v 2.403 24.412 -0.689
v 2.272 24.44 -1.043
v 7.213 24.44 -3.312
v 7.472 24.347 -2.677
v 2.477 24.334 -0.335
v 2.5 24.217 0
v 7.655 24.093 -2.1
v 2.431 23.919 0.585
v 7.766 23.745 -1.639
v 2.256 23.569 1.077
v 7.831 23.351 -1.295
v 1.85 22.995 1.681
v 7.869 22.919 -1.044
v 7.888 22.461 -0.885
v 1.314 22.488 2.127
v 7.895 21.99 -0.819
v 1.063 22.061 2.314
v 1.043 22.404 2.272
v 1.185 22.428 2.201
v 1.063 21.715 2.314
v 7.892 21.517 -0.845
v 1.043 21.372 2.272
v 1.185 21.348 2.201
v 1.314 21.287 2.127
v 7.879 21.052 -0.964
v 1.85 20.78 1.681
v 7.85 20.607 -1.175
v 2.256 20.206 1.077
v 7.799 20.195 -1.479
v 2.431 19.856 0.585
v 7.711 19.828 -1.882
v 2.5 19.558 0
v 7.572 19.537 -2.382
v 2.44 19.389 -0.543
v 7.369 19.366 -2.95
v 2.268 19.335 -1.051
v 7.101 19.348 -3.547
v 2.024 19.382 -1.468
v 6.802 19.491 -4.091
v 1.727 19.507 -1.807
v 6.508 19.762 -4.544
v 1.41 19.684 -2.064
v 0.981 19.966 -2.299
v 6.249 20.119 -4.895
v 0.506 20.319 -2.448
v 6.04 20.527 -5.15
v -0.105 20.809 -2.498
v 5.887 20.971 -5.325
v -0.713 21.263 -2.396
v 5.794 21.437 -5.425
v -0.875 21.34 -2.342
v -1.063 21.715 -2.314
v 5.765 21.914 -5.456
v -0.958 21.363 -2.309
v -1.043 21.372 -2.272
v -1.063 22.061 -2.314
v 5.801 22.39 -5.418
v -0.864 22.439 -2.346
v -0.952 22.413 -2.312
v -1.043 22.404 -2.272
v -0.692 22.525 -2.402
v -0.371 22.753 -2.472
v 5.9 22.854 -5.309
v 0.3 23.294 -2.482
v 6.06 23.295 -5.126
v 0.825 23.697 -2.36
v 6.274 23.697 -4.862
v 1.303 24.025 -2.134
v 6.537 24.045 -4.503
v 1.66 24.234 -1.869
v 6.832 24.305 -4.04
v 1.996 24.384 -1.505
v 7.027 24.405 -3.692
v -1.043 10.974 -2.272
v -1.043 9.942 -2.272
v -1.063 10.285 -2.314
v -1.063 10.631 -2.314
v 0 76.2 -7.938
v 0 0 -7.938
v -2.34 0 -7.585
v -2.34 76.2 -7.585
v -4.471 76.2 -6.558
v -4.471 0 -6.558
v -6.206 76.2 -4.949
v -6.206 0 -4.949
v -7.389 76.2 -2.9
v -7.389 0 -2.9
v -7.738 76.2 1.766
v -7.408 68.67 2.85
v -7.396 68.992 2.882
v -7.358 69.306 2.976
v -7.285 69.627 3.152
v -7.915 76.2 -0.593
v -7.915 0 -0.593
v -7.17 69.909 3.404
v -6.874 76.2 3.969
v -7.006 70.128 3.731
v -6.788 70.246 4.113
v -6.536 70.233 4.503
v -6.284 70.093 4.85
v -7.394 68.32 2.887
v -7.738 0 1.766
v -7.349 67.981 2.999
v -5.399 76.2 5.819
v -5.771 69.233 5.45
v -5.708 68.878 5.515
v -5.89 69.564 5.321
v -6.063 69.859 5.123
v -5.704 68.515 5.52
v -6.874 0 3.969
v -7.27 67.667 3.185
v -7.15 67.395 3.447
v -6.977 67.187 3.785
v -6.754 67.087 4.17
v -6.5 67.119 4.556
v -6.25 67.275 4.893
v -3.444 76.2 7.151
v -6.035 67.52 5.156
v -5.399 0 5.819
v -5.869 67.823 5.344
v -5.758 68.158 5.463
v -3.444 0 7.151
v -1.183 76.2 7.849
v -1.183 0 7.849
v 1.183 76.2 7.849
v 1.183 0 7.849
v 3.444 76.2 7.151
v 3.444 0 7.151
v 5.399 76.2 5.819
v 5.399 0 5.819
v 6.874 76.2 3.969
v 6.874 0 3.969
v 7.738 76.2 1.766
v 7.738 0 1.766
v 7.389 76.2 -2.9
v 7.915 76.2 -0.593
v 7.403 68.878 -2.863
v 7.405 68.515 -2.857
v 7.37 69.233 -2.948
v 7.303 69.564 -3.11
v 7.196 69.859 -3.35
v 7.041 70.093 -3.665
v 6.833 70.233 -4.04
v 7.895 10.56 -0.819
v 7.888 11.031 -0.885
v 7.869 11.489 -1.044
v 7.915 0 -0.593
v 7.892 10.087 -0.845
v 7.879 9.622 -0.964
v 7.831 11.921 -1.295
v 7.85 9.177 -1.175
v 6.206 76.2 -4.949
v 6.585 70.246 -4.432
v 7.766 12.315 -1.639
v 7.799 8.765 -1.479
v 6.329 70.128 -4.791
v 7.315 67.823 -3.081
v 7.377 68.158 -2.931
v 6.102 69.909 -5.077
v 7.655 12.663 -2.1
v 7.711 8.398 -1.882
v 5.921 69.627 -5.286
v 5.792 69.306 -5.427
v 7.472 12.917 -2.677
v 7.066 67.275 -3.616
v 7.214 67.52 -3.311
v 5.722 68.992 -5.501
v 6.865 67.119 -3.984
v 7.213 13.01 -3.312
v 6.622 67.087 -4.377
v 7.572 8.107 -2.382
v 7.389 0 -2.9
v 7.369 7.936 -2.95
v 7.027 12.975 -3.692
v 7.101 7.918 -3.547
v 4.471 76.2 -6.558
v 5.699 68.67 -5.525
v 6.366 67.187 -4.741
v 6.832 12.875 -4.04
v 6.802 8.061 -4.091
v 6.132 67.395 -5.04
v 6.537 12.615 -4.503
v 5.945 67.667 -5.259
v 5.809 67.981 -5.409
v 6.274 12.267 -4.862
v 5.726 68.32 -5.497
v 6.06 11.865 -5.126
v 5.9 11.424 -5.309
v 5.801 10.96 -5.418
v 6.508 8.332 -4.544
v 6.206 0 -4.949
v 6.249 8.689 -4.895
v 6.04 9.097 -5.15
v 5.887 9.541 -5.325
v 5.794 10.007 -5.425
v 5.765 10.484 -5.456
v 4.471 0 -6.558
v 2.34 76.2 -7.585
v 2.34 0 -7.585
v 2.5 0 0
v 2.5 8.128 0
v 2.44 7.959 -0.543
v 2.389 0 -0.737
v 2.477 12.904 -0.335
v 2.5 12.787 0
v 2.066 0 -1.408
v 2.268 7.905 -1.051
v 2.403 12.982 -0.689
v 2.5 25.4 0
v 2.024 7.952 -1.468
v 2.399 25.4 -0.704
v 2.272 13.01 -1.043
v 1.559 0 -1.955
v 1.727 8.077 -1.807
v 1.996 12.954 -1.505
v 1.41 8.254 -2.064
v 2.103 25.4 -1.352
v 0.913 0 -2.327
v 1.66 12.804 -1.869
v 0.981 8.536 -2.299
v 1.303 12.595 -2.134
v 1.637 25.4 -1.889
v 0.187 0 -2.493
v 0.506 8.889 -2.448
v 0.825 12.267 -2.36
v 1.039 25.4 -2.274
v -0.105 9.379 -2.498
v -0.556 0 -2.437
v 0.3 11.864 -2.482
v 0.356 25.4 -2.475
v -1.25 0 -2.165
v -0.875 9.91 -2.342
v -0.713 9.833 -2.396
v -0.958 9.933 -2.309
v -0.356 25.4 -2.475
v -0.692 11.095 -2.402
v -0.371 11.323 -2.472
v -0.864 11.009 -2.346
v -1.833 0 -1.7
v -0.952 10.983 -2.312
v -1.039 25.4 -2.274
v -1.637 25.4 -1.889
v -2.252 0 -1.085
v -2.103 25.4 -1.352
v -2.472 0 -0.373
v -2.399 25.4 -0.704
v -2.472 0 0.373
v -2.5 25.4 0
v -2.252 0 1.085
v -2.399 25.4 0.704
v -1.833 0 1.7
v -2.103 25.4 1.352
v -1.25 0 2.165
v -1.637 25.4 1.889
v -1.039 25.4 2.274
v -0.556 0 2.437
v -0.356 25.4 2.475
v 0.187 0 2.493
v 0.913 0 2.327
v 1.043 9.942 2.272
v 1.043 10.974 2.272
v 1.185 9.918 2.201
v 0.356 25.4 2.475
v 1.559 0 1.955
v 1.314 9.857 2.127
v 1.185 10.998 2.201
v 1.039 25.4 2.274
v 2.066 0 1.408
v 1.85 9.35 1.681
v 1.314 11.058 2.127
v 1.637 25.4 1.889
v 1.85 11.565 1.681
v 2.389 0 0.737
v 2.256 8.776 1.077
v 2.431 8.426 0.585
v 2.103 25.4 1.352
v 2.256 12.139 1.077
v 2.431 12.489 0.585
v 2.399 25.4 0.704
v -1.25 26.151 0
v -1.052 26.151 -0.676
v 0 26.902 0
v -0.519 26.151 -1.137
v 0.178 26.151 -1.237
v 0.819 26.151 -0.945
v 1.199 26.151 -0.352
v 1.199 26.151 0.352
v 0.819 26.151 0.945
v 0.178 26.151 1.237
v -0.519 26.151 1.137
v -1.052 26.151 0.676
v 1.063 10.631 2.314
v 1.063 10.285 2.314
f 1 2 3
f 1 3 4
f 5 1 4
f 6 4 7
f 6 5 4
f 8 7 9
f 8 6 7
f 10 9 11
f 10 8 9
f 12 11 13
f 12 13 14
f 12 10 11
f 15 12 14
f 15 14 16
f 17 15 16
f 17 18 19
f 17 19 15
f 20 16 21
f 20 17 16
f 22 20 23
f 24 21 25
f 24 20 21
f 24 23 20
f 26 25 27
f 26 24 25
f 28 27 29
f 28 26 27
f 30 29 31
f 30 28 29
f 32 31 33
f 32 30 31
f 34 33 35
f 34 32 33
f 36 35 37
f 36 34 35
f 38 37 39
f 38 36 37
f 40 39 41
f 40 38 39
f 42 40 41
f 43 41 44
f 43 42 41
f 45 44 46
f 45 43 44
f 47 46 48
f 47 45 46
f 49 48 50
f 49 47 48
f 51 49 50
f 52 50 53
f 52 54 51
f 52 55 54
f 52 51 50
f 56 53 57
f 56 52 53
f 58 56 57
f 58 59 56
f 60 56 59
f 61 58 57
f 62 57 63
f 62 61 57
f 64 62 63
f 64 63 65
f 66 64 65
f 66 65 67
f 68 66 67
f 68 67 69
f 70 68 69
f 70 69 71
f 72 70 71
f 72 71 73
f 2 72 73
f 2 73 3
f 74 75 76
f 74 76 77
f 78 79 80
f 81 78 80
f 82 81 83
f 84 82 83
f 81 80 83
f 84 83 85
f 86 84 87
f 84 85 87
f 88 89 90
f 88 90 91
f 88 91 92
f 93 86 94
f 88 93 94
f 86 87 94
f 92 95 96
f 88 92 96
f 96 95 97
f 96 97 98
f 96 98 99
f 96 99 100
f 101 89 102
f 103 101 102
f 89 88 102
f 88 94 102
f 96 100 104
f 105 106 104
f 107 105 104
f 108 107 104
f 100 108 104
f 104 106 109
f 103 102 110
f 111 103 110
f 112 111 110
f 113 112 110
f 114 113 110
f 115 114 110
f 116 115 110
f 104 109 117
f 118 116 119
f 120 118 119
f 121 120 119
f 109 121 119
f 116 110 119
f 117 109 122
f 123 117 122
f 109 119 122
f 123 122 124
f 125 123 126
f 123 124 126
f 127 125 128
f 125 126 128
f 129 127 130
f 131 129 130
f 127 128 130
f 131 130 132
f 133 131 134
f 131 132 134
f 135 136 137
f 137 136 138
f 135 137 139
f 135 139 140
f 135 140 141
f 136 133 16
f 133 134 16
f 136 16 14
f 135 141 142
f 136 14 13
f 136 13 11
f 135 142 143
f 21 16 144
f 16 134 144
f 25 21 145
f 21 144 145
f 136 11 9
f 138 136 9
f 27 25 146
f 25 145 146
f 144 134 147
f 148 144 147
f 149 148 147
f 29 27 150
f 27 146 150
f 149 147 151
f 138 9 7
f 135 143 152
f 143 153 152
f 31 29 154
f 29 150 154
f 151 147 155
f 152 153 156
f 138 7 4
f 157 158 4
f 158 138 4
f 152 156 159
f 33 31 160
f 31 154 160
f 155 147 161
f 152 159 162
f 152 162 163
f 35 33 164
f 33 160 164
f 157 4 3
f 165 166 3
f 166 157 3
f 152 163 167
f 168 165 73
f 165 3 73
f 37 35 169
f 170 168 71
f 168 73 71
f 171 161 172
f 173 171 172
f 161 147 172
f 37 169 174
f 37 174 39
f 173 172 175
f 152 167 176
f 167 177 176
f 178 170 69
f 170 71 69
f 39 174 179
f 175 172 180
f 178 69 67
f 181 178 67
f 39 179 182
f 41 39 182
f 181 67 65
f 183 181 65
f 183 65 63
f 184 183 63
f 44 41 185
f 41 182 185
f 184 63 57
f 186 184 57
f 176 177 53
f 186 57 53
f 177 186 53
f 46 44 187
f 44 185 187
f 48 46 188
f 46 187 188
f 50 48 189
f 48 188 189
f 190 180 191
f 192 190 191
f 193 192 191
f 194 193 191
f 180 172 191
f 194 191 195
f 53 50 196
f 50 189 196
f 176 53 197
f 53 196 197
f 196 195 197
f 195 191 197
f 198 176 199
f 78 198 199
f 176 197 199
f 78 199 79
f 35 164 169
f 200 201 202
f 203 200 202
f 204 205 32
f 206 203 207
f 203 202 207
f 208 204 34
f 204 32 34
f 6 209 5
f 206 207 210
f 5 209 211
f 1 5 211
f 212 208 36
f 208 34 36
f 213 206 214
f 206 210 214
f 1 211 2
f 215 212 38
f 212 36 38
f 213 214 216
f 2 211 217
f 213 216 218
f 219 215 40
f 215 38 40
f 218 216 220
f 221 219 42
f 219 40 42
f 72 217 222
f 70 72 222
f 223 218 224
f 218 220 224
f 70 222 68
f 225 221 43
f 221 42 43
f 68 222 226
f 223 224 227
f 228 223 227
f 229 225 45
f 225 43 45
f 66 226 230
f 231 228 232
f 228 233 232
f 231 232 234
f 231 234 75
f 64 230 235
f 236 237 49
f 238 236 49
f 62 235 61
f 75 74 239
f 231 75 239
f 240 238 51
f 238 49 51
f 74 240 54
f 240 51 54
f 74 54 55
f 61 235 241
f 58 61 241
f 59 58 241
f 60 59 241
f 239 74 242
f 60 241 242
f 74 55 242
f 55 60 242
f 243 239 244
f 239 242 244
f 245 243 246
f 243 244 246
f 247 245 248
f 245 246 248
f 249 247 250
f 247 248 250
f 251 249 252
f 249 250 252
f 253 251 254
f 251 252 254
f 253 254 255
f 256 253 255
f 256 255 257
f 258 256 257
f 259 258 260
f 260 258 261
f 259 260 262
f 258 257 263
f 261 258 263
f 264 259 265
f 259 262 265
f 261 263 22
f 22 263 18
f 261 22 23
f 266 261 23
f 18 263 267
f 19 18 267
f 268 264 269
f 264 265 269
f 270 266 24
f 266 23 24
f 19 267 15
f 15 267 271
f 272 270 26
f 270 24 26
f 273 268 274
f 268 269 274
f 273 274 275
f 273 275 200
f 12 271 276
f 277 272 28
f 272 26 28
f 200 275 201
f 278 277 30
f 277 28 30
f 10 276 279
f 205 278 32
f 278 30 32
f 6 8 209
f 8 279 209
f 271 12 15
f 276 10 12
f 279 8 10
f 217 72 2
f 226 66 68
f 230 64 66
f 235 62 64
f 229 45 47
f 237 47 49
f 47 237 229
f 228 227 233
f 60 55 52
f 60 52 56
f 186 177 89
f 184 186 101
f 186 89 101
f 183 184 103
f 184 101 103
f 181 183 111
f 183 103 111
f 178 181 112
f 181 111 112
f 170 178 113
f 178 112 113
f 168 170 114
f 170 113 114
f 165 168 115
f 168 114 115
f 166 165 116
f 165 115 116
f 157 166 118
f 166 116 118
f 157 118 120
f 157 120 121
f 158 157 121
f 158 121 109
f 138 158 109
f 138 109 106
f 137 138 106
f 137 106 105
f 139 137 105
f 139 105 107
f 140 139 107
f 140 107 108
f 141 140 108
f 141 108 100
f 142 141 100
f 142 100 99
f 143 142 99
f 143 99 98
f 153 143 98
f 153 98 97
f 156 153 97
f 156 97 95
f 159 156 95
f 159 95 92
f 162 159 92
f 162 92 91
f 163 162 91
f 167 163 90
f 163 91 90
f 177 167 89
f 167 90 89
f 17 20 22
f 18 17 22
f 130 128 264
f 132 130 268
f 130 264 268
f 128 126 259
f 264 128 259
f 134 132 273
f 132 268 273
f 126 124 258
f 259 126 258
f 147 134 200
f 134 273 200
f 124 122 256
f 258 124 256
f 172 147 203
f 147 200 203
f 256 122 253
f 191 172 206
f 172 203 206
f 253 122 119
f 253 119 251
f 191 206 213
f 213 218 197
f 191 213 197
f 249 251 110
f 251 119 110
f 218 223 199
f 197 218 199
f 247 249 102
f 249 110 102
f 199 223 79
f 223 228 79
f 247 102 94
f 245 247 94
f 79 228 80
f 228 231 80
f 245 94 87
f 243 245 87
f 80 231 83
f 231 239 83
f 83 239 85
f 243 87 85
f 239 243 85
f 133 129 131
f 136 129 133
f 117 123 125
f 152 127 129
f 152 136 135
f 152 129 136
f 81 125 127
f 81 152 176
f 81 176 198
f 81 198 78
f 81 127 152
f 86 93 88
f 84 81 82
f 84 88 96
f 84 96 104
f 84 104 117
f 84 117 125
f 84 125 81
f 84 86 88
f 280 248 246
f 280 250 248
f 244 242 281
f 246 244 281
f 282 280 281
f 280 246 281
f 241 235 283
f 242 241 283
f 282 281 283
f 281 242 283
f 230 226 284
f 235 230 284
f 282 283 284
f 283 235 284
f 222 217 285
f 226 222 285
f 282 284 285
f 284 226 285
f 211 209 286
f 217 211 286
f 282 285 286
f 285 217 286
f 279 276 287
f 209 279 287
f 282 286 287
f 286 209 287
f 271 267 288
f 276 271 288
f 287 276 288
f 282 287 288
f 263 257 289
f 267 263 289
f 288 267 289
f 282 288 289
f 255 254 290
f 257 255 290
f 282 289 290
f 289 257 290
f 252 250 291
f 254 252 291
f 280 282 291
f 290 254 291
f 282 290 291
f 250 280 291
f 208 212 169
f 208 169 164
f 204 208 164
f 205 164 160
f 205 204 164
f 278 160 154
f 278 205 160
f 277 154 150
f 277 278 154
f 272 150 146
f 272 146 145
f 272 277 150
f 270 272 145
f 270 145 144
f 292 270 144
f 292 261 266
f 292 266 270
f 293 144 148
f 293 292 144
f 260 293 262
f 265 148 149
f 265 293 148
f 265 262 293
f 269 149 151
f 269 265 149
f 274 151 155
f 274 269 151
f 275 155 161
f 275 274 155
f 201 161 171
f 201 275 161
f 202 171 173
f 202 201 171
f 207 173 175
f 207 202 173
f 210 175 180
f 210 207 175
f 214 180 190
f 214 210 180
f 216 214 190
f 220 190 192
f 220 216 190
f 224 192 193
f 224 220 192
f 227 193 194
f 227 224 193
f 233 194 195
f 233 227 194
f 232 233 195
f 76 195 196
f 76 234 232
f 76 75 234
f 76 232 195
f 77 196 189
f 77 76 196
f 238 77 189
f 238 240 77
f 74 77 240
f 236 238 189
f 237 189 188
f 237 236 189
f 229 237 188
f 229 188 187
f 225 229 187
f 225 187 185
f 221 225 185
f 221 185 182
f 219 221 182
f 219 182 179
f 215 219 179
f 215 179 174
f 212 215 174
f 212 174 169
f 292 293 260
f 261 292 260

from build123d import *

# Parameters (mm, degrees)
SKETCH1_R                           = 7.9375
BOSS_EXTRUDE1_DEPTH                 = 76.2
F_1_8_0_1250_DOWEL_HOLE1_D          = 3.175
F_1_8_0_1250_DOWEL_HOLE1_DEPTH      = 17.526
F_1_8_0_1250_DOWEL_HOLE1_TIP        = 0.953866233
F_5_0MM_DOWEL_HOLE1_D               = 5
F_5_0MM_DOWEL_HOLE1_DEPTH           = 25.4
F_5_0MM_DOWEL_HOLE1_TIP             = 1.502151548
TAP_DRILL_FOR_1_4_20_TAP1_OUTLINE_R = 2.5527
TAP_DRILL_FOR_1_4_20_TAP1_DEPTH     = 9


with BuildPart() as part:
    # Sketch1 → Boss-Extrude1 (new body)
    with BuildSketch(Plane(origin=(0, 0, 0), x_dir=(1, 0, 0), z_dir=(0, 1, 0))):
        with Locations(Location((0, 0, 0), (0, 0, 90))):
            Circle(SKETCH1_R)
    extrude(amount=BOSS_EXTRUDE1_DEPTH)

    # 1/8 (0.1250) Dowel Hole1
    with Locations(Plane(origin=(6.688476845, 68.670007772, -4.274129589), x_dir=(0.538473019062, 0, 0.842642752145), z_dir=(0.842642752145, 0, -0.538473019062))):
        with Locations((0, 0)):
            Hole(F_1_8_0_1250_DOWEL_HOLE1_D / 2, depth=F_1_8_0_1250_DOWEL_HOLE1_DEPTH)
            with Locations((0, 0, -(F_1_8_0_1250_DOWEL_HOLE1_DEPTH + F_1_8_0_1250_DOWEL_HOLE1_TIP / 2))):  # 118° drill point
                Cone(0, F_1_8_0_1250_DOWEL_HOLE1_D / 2, F_1_8_0_1250_DOWEL_HOLE1_TIP, mode=Mode.SUBTRACT)

    # Ø5.0mm Dowel Hole1
    with Locations(Plane(origin=(0, 0, 0), x_dir=(-1, 0, 0), z_dir=(0, -1, 0))):
        with Locations((0, 0)):
            Hole(F_5_0MM_DOWEL_HOLE1_D / 2, depth=F_5_0MM_DOWEL_HOLE1_DEPTH)
            with Locations((0, 0, -(F_5_0MM_DOWEL_HOLE1_DEPTH + F_5_0MM_DOWEL_HOLE1_TIP / 2))):  # 118° drill point
                Cone(0, F_5_0MM_DOWEL_HOLE1_D / 2, F_5_0MM_DOWEL_HOLE1_TIP, mode=Mode.SUBTRACT)

    # Tap Drill for 1/4-20 Tap1: read off the stored shape, not the designer's step
    # Tap Drill for 1/4-20 Tap1 outline → Tap Drill for 1/4-20 Tap1 (cut)
    with BuildSketch(Plane(origin=(0, 0, 0), x_dir=(0, 1, 0), z_dir=(0.9087676630767977, 0, -0.4173024497243409))):
        with Locations((10.457639215, 0)):
            Circle(TAP_DRILL_FOR_1_4_20_TAP1_OUTLINE_R)
        with Locations((21.887639215, 0)):
            Circle(TAP_DRILL_FOR_1_4_20_TAP1_OUTLINE_R)
    extrude(amount=TAP_DRILL_FOR_1_4_20_TAP1_DEPTH, mode=Mode.SUBTRACT)


solid = part.part
